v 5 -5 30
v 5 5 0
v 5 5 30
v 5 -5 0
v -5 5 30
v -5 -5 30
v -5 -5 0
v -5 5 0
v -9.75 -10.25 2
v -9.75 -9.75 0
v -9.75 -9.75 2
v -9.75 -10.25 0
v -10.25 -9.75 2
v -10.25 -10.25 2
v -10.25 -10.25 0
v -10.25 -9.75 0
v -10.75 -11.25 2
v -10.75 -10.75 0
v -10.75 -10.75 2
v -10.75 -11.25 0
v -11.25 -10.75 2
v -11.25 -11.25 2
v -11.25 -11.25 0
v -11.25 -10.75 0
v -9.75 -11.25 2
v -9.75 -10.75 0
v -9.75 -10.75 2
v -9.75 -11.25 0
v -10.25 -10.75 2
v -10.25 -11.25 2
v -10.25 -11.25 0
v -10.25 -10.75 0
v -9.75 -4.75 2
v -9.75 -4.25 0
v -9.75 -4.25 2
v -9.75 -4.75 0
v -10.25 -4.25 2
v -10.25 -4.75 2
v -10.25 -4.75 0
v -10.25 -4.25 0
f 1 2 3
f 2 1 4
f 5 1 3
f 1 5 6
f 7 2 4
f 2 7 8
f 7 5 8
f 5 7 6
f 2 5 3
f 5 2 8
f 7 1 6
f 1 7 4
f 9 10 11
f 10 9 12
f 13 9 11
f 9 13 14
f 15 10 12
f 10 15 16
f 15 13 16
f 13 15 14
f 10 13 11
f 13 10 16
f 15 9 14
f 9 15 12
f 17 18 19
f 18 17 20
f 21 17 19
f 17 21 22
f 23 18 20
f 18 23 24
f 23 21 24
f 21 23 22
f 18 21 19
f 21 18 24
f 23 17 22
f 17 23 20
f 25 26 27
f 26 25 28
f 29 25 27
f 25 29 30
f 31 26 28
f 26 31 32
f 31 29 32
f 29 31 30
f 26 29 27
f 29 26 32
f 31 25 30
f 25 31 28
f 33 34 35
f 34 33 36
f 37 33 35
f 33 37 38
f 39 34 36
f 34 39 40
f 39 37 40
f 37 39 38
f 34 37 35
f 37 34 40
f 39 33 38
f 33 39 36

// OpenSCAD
translate([0, 0, 15]) color([0,1,0]) cube([10, 10, 30], center=true);
translate([-10, -10, 1]) color([1,0,0]) cube([0.5, 0.5, 2], center=true);
translate([-11, -11, 1]) color([1,0,0]) cube([0.5, 0.5, 2], center=true);
translate([-10, -11, 1]) color([1,0,0]) cube([0.5, 0.5, 2], center=true);
translate([-10, -4.5, 1]) color([1,0,0]) cube([0.5, 0.5, 2], center=true);
